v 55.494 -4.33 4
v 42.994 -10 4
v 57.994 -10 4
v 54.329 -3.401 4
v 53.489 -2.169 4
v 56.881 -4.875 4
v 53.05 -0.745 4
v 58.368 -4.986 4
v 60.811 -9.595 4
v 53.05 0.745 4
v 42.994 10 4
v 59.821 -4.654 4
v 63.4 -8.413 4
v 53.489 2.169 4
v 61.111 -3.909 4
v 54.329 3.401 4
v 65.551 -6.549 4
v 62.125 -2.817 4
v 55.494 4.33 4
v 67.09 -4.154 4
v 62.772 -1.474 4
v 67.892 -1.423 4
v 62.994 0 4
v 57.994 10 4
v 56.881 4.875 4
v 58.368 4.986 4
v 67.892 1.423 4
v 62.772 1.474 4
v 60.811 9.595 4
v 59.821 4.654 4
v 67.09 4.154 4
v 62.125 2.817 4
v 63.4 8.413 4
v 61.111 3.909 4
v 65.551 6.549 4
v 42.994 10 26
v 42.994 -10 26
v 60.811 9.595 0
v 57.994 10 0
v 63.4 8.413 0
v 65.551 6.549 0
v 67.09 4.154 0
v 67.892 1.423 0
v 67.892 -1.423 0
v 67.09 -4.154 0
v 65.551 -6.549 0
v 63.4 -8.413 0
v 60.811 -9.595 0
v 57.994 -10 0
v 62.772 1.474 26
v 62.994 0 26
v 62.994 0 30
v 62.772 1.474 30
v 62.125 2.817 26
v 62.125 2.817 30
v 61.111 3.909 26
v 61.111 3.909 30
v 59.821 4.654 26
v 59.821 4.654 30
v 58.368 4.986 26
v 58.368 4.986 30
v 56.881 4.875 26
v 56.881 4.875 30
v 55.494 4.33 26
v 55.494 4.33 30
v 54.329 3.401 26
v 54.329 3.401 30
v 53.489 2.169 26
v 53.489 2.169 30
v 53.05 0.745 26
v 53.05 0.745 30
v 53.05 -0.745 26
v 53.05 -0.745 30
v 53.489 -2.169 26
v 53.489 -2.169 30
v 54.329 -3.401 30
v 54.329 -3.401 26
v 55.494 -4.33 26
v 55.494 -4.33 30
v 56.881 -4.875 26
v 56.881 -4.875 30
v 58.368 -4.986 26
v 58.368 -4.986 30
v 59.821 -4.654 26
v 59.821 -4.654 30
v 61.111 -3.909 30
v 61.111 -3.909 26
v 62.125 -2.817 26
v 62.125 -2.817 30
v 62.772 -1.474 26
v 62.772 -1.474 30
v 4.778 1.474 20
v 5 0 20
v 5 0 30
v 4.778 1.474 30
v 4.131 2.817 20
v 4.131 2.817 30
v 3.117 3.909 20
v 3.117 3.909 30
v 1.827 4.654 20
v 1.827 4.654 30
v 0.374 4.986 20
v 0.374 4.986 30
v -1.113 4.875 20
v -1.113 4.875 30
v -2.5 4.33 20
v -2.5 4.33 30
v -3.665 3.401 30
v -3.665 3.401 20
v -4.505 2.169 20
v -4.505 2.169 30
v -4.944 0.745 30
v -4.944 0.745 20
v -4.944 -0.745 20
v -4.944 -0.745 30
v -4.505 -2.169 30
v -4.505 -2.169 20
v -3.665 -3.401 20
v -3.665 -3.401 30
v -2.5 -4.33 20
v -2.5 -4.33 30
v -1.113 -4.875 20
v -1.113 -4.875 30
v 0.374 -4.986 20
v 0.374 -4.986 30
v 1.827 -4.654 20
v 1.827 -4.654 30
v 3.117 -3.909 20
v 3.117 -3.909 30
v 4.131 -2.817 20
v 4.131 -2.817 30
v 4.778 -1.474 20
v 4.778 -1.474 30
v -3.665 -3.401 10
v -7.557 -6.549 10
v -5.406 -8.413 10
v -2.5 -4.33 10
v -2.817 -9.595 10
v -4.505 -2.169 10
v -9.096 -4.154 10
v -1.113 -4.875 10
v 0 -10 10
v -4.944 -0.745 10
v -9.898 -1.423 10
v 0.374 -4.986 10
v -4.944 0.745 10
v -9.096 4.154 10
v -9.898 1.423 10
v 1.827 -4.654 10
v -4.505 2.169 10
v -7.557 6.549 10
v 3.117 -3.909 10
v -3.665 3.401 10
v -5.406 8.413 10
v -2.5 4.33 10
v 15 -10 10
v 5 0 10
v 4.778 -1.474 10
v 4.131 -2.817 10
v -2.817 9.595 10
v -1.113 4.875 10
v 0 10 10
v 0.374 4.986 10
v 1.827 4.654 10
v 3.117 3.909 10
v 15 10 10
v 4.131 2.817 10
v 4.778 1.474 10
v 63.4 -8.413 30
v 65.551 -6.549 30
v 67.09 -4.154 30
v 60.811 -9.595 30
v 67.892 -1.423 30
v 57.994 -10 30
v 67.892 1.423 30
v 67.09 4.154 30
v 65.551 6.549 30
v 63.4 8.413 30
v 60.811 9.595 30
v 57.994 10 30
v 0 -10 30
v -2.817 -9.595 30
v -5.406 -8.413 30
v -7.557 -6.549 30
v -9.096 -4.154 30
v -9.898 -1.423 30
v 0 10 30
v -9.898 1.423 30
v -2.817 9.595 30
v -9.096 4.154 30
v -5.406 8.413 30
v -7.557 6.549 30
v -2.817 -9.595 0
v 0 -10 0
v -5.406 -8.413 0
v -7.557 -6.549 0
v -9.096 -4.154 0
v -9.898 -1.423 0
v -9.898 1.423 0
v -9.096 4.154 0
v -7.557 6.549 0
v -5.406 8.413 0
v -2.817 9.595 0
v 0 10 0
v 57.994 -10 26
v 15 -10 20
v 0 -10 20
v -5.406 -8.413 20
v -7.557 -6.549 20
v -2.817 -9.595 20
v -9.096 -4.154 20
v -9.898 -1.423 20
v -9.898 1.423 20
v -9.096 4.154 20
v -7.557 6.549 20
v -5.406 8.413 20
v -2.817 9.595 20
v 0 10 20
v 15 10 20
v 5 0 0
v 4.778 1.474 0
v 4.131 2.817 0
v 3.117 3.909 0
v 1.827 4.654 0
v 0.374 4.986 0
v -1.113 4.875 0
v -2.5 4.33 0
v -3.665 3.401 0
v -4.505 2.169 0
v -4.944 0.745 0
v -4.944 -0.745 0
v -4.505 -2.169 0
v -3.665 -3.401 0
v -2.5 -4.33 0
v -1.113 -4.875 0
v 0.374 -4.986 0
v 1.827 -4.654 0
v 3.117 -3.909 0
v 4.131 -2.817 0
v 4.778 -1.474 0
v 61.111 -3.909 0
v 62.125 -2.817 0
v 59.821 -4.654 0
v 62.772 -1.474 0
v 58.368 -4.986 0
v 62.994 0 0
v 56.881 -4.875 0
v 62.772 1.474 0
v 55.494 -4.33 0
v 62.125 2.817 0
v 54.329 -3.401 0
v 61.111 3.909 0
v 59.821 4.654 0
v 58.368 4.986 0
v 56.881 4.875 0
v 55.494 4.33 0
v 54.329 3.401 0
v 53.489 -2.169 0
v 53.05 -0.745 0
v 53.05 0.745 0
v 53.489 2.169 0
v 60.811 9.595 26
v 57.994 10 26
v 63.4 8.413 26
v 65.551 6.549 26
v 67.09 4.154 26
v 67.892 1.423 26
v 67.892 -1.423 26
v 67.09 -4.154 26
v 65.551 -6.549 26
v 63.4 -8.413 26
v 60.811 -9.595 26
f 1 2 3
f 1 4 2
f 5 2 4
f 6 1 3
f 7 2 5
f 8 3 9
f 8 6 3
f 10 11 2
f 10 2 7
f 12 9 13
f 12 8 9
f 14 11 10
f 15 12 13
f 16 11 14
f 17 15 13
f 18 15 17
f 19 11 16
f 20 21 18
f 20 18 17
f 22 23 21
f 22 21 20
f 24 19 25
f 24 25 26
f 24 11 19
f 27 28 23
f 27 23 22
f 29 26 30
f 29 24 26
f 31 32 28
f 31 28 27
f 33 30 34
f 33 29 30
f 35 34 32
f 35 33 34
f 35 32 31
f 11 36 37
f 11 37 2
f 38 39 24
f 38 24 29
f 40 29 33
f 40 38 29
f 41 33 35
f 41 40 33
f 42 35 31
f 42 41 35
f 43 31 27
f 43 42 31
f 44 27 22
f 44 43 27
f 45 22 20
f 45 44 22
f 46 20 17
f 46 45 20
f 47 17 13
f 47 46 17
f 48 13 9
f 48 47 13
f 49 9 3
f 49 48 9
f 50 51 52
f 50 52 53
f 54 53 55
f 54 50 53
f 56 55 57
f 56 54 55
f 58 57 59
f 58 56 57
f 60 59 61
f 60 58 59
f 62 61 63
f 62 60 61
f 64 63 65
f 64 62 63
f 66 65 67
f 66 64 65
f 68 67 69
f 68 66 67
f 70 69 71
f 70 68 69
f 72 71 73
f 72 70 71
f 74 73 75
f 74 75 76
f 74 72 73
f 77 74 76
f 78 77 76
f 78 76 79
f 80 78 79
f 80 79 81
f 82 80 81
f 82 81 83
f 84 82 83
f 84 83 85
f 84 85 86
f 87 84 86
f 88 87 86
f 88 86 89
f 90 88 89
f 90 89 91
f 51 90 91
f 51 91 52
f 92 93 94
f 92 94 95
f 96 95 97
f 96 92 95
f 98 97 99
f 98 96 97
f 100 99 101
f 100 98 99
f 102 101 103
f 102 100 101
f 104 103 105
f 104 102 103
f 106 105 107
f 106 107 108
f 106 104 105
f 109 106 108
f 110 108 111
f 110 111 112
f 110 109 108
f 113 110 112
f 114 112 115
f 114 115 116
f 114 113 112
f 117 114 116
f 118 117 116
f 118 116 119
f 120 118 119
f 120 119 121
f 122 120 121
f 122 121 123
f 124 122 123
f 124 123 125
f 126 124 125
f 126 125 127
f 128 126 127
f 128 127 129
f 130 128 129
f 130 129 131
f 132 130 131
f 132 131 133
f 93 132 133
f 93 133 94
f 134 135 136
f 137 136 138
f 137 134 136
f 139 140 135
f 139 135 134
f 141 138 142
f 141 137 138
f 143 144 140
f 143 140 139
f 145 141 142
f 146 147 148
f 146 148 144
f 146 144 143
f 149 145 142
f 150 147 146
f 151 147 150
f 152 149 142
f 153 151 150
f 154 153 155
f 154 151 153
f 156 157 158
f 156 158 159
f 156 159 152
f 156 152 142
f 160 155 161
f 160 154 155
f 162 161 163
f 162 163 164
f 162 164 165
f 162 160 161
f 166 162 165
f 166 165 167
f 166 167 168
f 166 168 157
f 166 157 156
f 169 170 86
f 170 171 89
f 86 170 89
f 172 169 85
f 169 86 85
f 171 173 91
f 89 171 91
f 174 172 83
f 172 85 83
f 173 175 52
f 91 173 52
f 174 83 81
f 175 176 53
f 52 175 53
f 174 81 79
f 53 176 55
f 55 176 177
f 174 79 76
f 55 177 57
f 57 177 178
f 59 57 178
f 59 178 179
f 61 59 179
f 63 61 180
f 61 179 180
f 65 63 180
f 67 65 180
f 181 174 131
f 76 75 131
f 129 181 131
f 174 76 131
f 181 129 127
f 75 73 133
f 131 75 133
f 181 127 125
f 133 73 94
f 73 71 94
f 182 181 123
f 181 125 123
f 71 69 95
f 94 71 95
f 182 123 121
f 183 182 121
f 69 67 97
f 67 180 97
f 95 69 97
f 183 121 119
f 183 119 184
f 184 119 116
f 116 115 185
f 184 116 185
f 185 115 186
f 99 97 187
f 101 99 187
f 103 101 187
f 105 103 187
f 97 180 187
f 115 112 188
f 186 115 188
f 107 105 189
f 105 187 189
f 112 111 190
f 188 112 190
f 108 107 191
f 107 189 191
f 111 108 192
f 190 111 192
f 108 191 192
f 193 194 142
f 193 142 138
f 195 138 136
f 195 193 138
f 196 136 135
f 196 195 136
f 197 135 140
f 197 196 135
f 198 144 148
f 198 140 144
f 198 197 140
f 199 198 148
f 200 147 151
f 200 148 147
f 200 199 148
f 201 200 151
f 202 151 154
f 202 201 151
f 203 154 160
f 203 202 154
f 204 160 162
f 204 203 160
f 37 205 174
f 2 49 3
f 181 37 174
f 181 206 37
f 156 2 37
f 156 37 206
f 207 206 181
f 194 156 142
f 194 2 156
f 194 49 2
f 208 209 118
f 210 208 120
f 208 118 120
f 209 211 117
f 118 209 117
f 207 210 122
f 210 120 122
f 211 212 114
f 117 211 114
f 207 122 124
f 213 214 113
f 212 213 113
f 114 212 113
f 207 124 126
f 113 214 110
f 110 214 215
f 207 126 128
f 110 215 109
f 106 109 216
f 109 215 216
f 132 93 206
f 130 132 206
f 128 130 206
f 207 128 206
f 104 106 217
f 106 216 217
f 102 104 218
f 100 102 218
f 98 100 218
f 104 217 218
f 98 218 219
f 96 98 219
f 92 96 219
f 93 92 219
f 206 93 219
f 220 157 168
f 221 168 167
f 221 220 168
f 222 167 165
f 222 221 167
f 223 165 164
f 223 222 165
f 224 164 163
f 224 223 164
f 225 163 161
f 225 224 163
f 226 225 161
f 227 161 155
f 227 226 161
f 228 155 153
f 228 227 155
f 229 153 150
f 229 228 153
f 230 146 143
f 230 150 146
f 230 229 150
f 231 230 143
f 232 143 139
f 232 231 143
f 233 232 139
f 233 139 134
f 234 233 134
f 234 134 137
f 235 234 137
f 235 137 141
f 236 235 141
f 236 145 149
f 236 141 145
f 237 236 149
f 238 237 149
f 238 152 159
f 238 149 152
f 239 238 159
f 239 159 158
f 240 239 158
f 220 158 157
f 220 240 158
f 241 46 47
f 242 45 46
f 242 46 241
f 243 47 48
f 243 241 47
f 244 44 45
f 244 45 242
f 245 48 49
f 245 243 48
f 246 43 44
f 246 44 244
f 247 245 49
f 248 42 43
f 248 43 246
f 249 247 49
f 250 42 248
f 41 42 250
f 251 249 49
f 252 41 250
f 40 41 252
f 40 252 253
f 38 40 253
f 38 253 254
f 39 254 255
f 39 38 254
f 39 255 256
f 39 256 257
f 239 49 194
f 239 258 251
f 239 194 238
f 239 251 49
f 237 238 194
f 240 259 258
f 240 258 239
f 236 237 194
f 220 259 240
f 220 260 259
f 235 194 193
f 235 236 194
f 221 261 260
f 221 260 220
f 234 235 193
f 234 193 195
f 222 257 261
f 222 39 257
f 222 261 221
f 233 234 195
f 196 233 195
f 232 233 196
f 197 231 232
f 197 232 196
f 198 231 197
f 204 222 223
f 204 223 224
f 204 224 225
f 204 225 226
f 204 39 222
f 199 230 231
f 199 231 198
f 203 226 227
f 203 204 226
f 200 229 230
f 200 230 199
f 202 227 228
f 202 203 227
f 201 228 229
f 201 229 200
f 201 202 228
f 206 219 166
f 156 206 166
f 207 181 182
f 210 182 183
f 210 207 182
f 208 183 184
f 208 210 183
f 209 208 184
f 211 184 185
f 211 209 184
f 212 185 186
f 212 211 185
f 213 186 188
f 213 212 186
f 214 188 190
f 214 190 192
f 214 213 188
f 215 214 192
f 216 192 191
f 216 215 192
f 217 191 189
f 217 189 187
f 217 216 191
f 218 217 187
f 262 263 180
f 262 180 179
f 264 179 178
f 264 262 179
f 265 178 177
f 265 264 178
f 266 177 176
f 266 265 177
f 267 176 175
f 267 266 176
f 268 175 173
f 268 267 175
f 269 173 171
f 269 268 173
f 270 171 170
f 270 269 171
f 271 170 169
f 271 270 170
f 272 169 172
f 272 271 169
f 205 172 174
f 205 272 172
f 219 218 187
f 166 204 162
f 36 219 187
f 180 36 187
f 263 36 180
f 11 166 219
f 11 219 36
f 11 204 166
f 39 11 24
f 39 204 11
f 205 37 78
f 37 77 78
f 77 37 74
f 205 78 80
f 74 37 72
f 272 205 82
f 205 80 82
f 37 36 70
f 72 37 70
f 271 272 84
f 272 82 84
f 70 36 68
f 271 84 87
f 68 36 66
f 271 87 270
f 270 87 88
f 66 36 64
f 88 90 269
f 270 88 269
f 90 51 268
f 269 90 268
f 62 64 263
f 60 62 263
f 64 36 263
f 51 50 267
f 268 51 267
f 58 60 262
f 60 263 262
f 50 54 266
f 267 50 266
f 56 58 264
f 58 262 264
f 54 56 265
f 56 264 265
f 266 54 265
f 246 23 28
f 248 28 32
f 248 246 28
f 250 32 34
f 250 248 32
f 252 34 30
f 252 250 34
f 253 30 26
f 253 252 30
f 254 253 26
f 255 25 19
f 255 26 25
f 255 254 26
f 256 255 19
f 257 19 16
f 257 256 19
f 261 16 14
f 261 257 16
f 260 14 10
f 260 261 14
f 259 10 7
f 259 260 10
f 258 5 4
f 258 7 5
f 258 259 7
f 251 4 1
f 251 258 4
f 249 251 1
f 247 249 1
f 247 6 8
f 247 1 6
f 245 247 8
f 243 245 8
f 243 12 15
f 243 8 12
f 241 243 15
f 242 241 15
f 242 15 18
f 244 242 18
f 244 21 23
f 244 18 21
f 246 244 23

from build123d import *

# Parameters (mm, degrees)
SKETCH1_R           = 5
BOSS_EXTRUDE1_DEPTH = 30
SKETCH2_W           = 25
SKETCH2_H           = 10
SKETCH2_H_2         = 22
CUT_EXTRUDE1_DEPTH  = 77.962109955


with BuildPart() as part:
    # Sketch1 → Boss-Extrude1 (new body)
    with BuildSketch(Plane.XY):
        with BuildLine():
            Line((0, 10), (57.993870082, 10))
            ThreePointArc((57.993870082, 10), (67.993870082, 0), (57.993870082, -10))
            Line((57.993870082, -10), (0, -10))
            ThreePointArc((0, -10), (-10, 0), (0, 10))
        make_face()
        Circle(SKETCH1_R, mode=Mode.SUBTRACT)
        with Locations((57.993870082, 0)):
            Circle(SKETCH1_R, mode=Mode.SUBTRACT)
    extrude(amount=BOSS_EXTRUDE1_DEPTH)

    # Sketch2 → Cut-Extrude1 (cut, through all)
    with BuildSketch(Plane(origin=(0, 10, 0), x_dir=(1, 0, 0), z_dir=(0, 1, 0))):
        with Locations((2.5, -15)):
            Rectangle(SKETCH2_W, SKETCH2_H)
        with Locations((55.493870082, -15)):
            Rectangle(SKETCH2_W, SKETCH2_H_2)
    extrude(amount=-CUT_EXTRUDE1_DEPTH, mode=Mode.SUBTRACT)


solid = part.part
